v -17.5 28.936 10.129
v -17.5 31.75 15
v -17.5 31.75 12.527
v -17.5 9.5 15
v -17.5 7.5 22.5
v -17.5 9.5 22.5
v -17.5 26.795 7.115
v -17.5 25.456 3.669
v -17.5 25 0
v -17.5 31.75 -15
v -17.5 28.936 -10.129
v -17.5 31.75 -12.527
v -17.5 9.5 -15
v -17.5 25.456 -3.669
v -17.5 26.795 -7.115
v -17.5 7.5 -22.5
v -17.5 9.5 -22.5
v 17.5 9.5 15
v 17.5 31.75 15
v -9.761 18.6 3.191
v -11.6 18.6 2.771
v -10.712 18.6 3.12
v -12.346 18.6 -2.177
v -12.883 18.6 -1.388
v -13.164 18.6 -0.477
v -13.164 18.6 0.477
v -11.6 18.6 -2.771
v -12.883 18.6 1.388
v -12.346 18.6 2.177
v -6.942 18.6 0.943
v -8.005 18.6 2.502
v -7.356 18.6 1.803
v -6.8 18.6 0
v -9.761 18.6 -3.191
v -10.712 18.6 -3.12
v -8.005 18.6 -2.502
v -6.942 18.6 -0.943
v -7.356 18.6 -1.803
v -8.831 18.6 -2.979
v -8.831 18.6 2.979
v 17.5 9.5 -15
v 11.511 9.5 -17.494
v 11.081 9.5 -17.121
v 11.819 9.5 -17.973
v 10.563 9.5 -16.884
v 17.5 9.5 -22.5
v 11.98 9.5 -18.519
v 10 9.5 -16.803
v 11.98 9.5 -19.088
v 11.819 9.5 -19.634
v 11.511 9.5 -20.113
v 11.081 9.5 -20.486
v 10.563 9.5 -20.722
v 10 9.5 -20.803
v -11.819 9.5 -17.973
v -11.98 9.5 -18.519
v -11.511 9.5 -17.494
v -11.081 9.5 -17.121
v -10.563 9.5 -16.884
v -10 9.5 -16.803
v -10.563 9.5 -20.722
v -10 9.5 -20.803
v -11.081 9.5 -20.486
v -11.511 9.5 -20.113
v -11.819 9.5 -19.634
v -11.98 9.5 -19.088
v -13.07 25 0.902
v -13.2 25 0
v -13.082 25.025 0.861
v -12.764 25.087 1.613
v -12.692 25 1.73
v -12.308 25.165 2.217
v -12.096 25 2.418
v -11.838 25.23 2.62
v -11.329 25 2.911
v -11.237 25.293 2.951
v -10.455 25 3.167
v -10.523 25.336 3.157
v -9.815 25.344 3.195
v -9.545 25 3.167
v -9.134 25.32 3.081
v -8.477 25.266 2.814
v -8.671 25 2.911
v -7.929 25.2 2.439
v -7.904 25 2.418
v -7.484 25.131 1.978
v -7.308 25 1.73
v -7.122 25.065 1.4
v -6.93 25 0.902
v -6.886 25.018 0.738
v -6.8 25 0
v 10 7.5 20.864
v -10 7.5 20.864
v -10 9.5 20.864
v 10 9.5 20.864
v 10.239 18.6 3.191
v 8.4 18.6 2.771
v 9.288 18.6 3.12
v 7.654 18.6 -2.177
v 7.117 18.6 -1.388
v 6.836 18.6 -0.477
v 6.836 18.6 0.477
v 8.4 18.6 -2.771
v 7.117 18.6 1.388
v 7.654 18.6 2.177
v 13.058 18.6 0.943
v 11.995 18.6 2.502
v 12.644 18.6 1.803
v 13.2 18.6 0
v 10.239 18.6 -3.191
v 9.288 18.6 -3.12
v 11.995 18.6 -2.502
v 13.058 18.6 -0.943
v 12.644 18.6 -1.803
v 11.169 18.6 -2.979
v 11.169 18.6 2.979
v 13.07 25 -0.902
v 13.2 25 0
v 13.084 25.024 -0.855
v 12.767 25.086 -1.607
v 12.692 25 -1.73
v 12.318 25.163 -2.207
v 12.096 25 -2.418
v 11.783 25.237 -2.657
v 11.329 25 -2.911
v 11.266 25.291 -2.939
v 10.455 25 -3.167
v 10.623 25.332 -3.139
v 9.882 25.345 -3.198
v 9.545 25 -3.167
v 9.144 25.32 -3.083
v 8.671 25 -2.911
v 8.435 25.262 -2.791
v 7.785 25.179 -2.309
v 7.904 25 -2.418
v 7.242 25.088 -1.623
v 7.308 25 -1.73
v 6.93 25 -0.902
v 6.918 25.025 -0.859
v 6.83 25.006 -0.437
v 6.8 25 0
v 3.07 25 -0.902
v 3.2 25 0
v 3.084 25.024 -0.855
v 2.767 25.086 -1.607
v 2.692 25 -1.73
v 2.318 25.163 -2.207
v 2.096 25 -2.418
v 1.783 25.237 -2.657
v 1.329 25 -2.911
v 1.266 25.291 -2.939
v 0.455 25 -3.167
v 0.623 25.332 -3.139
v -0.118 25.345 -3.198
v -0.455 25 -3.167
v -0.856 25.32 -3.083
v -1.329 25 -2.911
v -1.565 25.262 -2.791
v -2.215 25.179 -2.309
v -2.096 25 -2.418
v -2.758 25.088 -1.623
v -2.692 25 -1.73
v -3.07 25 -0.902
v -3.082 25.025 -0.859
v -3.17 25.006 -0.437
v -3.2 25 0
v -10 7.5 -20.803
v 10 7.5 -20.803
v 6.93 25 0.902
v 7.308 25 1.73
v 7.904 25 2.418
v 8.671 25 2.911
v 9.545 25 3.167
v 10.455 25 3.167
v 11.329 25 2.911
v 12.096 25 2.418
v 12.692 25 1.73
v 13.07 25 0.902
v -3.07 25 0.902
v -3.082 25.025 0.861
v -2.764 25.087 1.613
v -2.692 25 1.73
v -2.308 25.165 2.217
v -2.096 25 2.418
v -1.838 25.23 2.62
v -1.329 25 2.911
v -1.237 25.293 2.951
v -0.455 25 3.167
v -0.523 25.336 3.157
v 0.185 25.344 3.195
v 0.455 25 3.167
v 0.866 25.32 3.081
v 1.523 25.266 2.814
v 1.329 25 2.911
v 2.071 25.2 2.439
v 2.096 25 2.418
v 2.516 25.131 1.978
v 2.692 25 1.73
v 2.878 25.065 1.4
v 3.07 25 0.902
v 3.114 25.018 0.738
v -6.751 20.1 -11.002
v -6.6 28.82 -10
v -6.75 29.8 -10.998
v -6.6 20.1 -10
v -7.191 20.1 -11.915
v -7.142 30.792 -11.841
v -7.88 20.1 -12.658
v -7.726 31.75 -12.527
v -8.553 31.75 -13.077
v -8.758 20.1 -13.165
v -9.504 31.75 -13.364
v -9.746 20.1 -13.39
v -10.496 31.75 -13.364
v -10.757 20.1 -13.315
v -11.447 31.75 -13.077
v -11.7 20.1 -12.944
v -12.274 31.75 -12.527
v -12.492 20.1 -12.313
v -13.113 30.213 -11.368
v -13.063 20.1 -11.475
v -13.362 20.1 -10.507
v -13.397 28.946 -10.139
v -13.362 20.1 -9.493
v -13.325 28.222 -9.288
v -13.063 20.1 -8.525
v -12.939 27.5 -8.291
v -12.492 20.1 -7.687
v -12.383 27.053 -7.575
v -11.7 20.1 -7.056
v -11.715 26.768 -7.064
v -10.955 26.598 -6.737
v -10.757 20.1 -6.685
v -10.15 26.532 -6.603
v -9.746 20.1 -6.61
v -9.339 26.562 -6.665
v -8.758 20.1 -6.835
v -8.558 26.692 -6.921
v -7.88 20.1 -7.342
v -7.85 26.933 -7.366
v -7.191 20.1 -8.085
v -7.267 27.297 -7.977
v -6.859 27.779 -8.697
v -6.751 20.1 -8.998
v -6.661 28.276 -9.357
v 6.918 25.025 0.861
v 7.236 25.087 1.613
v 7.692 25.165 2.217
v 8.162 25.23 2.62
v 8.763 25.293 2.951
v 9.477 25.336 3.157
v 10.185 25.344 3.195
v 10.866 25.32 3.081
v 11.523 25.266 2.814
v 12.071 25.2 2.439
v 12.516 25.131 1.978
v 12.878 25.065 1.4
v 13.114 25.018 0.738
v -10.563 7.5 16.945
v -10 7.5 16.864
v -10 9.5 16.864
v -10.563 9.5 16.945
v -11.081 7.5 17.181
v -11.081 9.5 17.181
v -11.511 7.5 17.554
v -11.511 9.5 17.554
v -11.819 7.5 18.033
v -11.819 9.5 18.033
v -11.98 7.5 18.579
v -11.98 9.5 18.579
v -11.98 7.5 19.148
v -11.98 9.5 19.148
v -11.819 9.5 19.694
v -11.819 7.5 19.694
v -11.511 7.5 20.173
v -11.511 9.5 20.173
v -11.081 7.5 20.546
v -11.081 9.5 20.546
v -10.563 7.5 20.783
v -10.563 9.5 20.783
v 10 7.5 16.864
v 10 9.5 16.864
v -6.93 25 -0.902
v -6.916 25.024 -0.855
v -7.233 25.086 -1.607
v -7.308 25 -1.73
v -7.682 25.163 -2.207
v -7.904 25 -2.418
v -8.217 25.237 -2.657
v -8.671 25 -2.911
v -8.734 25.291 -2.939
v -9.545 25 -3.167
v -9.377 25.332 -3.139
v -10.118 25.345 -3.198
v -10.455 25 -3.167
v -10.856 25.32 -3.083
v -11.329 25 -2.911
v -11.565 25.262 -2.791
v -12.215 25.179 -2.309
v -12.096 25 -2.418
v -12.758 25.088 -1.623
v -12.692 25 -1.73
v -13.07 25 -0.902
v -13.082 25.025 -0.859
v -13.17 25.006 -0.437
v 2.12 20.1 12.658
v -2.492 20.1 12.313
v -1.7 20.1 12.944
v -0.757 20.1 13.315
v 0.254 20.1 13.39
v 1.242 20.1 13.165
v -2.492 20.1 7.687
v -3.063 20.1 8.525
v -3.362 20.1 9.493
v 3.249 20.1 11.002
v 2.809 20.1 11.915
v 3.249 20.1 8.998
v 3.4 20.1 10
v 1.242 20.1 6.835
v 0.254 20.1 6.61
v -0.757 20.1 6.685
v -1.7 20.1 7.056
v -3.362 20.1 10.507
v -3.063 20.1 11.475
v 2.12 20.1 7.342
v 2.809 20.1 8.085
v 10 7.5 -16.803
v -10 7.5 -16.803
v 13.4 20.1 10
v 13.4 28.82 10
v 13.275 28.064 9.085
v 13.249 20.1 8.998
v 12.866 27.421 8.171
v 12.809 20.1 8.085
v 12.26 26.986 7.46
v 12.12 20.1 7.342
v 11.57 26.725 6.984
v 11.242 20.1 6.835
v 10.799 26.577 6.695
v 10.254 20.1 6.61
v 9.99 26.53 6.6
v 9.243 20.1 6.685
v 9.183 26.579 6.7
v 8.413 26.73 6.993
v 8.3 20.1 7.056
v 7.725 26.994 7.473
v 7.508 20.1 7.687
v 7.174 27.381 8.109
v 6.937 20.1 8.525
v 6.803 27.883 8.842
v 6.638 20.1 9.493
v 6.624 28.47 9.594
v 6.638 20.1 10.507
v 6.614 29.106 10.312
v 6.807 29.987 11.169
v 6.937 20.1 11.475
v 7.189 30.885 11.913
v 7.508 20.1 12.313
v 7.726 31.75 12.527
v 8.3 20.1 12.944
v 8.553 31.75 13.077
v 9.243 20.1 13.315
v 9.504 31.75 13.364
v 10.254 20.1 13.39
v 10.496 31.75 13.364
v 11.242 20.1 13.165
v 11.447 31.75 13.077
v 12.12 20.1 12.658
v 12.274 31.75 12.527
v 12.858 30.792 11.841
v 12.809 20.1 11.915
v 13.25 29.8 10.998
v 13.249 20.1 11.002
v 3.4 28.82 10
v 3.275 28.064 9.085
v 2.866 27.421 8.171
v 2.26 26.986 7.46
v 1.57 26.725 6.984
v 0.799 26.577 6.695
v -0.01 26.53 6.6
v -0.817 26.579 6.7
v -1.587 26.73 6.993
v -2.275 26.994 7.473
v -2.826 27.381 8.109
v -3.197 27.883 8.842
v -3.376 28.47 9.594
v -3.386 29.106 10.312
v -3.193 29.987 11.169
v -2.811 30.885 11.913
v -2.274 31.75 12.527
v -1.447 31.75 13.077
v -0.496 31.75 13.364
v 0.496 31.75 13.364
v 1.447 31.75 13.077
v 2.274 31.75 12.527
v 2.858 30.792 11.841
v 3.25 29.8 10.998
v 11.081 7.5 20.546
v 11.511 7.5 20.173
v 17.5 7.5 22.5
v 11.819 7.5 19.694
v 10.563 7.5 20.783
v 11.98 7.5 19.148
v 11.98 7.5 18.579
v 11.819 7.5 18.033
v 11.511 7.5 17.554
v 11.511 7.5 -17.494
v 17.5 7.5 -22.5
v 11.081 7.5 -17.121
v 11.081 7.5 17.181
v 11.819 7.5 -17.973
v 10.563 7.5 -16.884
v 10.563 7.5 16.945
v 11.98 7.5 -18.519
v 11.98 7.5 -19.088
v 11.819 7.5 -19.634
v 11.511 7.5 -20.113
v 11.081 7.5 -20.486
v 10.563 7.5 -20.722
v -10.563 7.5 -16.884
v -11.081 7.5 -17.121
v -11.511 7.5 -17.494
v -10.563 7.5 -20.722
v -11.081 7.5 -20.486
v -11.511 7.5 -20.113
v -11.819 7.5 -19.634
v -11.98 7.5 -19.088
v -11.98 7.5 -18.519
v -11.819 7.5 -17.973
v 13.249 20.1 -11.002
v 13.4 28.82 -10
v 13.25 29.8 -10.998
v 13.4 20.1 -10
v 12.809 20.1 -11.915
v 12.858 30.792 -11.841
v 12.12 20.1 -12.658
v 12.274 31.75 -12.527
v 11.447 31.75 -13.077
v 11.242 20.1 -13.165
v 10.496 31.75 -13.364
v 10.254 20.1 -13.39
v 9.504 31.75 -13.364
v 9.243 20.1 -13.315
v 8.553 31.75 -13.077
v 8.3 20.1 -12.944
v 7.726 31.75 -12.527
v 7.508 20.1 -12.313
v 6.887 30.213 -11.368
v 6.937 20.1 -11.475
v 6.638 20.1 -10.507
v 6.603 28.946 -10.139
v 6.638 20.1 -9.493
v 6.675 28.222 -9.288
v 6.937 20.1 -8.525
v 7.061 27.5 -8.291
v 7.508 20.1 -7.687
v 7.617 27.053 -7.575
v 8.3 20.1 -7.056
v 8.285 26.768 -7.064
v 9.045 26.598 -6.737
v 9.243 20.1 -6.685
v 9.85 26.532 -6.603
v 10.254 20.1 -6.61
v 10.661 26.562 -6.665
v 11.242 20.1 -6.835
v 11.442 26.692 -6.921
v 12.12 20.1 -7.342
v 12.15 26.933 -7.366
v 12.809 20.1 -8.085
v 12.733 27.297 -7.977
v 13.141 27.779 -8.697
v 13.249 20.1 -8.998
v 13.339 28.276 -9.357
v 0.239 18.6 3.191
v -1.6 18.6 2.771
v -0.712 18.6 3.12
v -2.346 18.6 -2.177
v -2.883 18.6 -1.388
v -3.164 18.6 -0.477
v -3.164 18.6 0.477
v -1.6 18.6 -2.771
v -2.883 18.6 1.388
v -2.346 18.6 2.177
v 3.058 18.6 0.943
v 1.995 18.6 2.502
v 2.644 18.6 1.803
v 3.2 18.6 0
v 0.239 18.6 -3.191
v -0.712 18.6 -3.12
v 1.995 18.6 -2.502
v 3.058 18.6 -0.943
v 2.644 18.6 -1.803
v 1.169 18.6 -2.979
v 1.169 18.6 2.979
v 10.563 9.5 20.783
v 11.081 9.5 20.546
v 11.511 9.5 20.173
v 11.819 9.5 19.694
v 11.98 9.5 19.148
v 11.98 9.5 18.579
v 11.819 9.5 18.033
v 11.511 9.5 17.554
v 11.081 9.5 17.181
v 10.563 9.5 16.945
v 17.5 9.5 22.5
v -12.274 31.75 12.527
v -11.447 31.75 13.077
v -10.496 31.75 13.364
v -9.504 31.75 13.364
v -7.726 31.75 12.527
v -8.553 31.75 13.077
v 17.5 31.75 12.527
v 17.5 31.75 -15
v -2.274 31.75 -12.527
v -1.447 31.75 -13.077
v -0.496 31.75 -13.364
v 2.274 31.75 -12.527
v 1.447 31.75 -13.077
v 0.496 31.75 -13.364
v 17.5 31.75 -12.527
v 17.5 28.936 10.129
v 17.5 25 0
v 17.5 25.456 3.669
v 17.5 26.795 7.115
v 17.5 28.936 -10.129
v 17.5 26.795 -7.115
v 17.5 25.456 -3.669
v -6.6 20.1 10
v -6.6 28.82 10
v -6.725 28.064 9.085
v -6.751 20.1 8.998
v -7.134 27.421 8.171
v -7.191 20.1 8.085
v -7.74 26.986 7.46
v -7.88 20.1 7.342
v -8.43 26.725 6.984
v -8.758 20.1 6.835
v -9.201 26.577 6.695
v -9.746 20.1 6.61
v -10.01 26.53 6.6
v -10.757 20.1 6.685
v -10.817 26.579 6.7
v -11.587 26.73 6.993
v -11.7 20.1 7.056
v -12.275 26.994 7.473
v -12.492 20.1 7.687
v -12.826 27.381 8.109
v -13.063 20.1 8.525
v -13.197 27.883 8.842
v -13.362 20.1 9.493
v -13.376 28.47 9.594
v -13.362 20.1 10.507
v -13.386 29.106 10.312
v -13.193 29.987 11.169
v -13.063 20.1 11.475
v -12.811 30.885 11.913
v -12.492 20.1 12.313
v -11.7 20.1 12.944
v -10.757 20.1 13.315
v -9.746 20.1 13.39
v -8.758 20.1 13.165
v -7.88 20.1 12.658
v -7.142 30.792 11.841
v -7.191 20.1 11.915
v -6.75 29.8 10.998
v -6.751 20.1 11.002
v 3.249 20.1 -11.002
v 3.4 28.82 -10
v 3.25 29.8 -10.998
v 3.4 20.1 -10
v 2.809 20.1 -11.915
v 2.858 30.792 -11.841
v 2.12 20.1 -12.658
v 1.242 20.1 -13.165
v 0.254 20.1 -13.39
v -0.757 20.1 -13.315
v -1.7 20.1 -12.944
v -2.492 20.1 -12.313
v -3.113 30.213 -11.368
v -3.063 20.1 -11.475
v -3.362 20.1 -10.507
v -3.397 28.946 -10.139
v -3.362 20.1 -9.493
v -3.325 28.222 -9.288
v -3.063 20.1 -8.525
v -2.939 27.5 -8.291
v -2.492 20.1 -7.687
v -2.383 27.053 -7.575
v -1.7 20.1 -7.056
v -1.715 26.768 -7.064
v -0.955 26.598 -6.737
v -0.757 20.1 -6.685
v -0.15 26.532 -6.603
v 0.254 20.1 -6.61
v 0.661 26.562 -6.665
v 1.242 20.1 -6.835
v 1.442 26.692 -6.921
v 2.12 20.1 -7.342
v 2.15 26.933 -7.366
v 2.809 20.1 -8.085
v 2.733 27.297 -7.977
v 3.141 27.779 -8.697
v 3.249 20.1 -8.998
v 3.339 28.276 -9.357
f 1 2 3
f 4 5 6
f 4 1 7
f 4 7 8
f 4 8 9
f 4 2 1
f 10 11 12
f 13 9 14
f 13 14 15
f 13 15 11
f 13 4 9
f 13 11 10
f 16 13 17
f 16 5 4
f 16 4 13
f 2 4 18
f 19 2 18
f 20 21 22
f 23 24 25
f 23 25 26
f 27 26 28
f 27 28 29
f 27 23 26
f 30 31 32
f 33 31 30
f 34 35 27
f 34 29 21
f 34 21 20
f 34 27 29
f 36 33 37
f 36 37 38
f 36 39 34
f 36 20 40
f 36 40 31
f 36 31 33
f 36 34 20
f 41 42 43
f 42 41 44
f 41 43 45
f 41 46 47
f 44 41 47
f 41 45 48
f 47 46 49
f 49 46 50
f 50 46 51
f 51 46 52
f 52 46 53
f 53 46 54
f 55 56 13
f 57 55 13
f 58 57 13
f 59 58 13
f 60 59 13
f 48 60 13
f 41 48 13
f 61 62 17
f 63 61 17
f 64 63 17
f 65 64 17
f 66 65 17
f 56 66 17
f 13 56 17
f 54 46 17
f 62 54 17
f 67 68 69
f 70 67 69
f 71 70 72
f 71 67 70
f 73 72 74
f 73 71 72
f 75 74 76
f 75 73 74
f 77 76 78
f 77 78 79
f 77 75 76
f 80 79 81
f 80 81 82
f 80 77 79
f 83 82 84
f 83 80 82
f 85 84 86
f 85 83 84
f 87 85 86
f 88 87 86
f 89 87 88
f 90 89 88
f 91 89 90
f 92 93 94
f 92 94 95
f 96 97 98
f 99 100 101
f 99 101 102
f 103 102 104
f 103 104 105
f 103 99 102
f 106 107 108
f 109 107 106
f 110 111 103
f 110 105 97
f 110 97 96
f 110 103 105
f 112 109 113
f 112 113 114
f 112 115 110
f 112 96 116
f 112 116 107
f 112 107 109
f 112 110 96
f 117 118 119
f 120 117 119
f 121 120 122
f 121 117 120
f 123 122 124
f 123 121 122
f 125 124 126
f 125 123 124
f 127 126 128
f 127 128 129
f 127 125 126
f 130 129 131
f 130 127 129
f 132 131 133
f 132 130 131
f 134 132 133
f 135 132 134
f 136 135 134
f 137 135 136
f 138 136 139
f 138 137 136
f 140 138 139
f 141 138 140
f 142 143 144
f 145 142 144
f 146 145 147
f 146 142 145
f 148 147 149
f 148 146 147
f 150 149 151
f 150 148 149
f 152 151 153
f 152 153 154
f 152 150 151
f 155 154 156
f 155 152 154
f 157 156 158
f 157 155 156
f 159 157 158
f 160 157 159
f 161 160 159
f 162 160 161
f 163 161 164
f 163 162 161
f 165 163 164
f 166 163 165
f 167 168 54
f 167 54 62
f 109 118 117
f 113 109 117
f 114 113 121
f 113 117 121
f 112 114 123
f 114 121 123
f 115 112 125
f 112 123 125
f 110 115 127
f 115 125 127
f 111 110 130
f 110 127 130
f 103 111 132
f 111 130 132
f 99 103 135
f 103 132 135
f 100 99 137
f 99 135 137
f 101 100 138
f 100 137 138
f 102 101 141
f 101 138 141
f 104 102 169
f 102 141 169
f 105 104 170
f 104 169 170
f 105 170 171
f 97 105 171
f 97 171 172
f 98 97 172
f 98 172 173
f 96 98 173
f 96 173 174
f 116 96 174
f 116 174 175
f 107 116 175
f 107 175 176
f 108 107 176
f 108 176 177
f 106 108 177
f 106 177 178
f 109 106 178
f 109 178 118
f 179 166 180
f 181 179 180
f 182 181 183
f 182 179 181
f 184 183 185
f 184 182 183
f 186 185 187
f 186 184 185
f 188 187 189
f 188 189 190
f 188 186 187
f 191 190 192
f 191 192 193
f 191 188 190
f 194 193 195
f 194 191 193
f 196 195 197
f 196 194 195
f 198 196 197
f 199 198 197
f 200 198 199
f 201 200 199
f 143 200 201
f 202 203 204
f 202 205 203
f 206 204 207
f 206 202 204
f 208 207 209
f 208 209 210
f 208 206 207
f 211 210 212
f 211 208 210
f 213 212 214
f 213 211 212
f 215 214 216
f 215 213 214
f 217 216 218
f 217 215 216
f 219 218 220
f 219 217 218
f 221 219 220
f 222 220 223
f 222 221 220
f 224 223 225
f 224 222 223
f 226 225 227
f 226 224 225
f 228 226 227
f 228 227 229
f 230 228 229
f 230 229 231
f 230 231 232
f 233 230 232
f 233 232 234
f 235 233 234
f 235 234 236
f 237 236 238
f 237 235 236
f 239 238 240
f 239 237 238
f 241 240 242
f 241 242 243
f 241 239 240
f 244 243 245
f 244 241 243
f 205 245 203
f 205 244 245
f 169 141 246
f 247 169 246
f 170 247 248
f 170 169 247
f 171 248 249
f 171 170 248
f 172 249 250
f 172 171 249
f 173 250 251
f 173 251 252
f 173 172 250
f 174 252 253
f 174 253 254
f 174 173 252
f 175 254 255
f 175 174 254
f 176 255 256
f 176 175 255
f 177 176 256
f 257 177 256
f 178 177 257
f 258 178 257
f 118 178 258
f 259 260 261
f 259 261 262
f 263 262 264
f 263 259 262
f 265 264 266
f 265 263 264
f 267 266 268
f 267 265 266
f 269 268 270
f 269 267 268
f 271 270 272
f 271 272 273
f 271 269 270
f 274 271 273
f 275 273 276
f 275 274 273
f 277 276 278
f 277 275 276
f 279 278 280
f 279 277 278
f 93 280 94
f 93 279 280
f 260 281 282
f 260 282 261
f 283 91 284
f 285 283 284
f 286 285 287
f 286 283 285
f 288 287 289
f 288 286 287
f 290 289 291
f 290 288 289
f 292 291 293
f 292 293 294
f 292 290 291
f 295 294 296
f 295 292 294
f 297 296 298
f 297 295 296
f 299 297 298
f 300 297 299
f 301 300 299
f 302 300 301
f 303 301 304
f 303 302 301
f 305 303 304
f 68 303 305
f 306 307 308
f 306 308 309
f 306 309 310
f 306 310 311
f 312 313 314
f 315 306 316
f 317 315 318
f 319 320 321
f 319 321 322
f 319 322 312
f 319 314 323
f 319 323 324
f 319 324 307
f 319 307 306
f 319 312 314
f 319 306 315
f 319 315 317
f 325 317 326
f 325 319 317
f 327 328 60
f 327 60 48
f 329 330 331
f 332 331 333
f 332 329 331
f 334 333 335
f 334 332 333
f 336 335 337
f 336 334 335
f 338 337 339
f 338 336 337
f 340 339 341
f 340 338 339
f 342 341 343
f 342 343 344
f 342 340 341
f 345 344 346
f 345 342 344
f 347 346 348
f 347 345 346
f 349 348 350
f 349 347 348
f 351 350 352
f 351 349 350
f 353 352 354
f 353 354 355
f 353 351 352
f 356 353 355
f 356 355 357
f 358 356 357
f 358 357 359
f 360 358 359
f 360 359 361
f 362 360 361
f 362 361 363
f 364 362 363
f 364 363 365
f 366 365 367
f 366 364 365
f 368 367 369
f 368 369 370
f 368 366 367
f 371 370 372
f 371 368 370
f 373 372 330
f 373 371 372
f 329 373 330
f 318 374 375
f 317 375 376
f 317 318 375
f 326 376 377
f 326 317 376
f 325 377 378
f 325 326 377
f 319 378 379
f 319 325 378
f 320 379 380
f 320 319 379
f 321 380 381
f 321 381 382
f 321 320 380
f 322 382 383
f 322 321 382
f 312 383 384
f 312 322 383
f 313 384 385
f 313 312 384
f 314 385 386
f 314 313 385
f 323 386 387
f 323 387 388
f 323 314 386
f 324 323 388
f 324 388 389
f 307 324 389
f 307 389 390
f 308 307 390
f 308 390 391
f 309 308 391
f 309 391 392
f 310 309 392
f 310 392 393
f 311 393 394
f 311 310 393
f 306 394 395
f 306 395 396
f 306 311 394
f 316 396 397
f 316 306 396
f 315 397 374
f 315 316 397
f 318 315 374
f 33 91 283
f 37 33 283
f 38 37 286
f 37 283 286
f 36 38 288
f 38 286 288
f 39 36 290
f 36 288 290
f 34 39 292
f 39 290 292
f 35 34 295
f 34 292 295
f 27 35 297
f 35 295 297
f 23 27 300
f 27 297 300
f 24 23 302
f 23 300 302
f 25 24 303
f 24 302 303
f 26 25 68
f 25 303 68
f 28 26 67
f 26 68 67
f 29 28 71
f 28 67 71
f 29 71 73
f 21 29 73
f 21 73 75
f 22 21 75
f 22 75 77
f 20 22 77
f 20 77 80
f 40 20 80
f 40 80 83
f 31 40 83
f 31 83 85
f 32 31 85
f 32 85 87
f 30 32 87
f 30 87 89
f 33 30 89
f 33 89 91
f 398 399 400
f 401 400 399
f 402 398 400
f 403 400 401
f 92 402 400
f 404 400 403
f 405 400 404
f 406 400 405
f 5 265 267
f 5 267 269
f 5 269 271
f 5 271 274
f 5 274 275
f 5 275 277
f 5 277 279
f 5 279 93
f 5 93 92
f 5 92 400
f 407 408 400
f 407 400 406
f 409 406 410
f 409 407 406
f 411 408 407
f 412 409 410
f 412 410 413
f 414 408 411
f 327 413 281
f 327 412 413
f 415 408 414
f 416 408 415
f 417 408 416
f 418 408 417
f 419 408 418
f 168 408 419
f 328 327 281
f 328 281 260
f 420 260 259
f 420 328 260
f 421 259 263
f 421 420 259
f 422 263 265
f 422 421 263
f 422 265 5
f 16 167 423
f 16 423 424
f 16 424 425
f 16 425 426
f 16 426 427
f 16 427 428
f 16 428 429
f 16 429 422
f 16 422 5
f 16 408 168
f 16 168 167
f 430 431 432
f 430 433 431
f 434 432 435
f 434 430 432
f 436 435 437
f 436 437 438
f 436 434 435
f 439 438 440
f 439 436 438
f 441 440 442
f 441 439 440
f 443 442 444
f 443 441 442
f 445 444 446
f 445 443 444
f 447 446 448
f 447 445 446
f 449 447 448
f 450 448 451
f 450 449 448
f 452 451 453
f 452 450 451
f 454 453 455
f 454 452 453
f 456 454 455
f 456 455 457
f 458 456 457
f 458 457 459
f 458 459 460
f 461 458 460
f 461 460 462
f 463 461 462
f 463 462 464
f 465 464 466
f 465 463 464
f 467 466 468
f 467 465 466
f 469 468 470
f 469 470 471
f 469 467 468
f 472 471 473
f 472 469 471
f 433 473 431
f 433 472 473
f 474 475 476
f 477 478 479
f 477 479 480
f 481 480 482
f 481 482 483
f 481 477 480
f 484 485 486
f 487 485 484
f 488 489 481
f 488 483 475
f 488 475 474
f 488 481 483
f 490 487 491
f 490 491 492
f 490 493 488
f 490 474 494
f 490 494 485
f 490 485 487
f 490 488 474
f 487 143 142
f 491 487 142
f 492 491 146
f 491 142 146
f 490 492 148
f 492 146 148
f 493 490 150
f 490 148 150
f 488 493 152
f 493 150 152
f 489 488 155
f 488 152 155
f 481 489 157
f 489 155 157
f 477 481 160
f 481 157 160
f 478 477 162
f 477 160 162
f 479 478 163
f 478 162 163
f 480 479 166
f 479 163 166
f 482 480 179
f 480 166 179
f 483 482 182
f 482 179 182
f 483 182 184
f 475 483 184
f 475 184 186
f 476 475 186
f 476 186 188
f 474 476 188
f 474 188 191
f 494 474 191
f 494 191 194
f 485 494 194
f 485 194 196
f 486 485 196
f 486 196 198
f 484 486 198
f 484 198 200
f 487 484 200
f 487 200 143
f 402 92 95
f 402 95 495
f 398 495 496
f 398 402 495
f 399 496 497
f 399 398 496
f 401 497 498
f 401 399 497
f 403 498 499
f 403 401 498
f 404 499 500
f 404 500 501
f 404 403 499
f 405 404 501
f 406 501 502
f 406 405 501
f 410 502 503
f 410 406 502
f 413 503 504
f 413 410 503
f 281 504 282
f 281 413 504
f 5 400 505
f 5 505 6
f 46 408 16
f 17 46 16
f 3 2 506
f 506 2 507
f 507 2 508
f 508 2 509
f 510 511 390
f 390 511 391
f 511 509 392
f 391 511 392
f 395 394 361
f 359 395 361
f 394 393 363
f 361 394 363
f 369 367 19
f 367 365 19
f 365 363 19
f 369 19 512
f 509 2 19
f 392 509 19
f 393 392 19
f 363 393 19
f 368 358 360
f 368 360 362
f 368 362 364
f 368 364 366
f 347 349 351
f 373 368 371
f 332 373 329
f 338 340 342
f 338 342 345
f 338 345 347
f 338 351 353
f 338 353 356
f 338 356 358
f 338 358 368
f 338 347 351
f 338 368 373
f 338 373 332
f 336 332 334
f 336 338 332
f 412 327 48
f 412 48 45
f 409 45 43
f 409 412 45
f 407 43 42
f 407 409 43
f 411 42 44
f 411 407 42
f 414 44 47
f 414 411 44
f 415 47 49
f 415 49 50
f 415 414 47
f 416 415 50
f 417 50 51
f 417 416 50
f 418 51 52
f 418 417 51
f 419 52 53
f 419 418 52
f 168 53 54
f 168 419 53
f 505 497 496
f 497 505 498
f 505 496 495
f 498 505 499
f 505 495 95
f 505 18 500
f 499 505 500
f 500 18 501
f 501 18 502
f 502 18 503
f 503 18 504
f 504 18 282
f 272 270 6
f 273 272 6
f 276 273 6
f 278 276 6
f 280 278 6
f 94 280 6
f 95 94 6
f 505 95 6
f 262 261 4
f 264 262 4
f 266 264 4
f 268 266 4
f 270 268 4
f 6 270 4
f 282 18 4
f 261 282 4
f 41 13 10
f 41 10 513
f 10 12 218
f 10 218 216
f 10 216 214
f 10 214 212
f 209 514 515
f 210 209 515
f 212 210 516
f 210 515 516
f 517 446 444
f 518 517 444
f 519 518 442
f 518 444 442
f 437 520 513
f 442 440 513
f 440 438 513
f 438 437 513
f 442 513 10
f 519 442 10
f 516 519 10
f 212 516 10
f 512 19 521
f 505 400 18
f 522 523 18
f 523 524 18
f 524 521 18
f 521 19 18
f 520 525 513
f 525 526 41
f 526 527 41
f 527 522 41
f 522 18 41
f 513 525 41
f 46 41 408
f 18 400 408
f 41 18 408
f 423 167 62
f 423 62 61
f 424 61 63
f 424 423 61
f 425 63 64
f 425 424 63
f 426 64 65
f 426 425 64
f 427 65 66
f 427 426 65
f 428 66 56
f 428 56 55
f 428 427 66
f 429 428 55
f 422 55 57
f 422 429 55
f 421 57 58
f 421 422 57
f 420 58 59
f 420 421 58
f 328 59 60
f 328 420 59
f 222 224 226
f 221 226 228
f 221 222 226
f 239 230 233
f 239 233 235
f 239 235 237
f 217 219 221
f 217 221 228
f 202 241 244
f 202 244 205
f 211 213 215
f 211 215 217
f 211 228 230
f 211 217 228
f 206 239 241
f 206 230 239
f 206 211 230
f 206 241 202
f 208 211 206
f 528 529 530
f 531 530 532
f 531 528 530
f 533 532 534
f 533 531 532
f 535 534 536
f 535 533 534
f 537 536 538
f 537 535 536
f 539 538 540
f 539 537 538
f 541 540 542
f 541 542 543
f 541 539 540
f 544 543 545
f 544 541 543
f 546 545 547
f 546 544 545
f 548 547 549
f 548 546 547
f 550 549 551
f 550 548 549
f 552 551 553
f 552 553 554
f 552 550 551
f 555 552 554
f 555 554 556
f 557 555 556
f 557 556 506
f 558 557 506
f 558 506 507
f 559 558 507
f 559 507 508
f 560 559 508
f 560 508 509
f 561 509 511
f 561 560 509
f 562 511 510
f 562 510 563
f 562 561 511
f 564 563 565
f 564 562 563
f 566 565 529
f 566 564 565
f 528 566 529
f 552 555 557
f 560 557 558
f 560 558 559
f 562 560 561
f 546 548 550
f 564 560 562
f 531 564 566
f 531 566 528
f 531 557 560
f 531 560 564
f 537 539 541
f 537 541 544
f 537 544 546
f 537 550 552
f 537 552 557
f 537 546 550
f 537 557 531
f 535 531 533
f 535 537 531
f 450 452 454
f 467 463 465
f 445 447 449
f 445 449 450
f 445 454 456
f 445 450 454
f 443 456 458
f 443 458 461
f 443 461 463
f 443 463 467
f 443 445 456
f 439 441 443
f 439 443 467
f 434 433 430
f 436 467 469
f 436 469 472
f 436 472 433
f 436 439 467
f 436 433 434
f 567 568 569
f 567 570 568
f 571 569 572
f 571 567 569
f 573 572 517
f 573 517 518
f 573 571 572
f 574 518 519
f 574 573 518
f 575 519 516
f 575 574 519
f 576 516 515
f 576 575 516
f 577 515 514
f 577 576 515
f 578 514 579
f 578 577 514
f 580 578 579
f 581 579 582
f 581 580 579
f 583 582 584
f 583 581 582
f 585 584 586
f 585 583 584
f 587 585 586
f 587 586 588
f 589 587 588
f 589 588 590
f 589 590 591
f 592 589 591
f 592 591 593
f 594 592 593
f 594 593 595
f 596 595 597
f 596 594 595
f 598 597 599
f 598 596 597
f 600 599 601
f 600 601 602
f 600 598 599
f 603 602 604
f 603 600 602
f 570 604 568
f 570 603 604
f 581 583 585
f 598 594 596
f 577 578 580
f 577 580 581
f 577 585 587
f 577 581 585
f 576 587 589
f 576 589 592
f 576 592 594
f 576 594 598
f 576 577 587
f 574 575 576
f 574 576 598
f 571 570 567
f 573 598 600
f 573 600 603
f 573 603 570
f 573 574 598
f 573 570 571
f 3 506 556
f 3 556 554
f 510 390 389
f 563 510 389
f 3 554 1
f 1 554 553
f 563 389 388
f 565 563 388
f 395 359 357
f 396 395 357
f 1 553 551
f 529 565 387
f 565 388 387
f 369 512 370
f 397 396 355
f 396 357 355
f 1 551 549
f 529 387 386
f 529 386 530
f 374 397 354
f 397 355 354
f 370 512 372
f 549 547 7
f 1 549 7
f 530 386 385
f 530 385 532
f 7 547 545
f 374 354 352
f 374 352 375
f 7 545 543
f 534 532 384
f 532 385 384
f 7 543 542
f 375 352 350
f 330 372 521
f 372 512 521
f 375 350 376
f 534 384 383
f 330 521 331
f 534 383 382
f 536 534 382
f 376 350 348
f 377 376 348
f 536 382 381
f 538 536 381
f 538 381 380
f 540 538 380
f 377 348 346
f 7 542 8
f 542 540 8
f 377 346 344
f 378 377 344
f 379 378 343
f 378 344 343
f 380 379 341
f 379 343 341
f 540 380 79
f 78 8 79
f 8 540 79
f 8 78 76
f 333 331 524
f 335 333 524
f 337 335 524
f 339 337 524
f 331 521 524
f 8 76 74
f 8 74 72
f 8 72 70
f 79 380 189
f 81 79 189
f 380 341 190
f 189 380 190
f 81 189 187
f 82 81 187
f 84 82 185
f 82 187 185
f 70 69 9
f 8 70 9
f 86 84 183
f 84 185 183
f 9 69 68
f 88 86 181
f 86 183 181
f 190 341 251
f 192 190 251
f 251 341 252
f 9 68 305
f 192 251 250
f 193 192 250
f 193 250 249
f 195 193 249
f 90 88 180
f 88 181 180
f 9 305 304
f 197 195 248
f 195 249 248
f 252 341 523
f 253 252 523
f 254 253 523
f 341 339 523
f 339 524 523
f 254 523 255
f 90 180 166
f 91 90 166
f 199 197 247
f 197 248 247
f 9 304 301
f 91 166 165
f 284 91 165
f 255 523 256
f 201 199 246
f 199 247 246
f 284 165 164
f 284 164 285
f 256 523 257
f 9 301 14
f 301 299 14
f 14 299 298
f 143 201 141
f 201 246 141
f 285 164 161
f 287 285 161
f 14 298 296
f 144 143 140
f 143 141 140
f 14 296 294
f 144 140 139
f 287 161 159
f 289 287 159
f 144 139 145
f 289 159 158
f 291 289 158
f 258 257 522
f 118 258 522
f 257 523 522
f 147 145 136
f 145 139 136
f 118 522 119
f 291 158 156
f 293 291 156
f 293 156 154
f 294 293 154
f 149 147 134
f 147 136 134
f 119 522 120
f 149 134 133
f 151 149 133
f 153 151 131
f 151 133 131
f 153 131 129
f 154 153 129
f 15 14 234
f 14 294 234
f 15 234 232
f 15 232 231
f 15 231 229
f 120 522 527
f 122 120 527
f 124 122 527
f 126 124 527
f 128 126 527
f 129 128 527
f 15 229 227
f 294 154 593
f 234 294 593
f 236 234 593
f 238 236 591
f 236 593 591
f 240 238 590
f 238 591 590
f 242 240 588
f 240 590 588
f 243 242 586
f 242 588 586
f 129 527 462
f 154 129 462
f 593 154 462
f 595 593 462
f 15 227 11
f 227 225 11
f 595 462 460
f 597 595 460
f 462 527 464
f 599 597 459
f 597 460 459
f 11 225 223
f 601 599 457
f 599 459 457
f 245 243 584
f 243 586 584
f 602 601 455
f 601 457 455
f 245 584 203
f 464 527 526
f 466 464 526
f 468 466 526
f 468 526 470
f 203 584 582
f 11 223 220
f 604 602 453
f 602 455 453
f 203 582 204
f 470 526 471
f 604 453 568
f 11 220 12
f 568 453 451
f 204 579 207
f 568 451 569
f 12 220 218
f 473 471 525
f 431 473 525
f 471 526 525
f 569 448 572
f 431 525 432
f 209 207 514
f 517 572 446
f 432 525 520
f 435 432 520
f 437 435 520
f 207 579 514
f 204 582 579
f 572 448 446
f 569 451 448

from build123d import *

# Parameters (mm, degrees)
SKETCH8_W                       = 35
SKETCH8_H                       = 30
BOSS_EXTRUDE7_DEPTH             = 80
SKETCH10_R                      = 15
CUT_EXTRUDE3_DEPTH              = 18.5
CUT_EXTRUDE3_DEPTH_BACK         = 18.5
SKETCH11_W                      = 38.336381606
SKETCH11_H                      = 16.50007926
CUT_EXTRUDE4_DEPTH              = 18.5
CUT_EXTRUDE4_DEPTH_BACK         = 18.5
SKETCH12_W                      = 33.824881692
SKETCH12_H                      = 7.5
CUT_EXTRUDE5_DEPTH              = 18.5
CUT_EXTRUDE5_DEPTH_BACK         = 18.5
SKETCH13_W                      = 45.541829225
SKETCH13_H                      = 41.48776408
CUT_EXTRUDE6_DEPTH              = 18.5
CUT_EXTRUDE6_DEPTH_BACK         = 18.5
SKETCH15_W                      = 35
SKETCH15_H                      = 7.5
BOSS_EXTRUDE9_DEPTH             = 2
CUT_EXTRUDE7_DEPTH              = 2
SKETCH18_R                      = 3.2
CUT_EXTRUDE10_DEPTH             = 7.74996037
CUT_EXTRUDE10_DEPTH_BACK        = 6.4
CUT_EXTRUDE11_REACH             = 8.75
SKETCH19_R                      = 3.4
CUT_EXTRUDE11_DIRECTION_2_DEPTH = 4.9


with BuildPart() as part:
    # Sketch8 → Boss-Extrude7 (new body)
    with BuildSketch(Plane(origin=(0, 0, 0), x_dir=(1, 0, 0), z_dir=(0, 1, 0))):
        Rectangle(SKETCH8_W, SKETCH8_H)
    extrude(amount=BOSS_EXTRUDE7_DEPTH)

    # Sketch10 → Cut-Extrude3 (cut, two sides)
    with BuildSketch(Plane(origin=(0, 0, 0), x_dir=(0, 0, -1), z_dir=(1, 0, 0))) as cut_extrude3_sk:
        with Locations((0, 40)):
            Circle(SKETCH10_R)
    extrude(amount=CUT_EXTRUDE3_DEPTH, mode=Mode.SUBTRACT)
    extrude(cut_extrude3_sk.sketch, amount=-CUT_EXTRUDE3_DEPTH_BACK, mode=Mode.SUBTRACT)

    # Sketch11 → Cut-Extrude4 (cut, two sides)
    with BuildSketch(Plane(origin=(0, 0, 0), x_dir=(0, 0, -1), z_dir=(1, 0, 0))) as cut_extrude4_sk:
        with Locations((0, 40)):
            Rectangle(SKETCH11_W, SKETCH11_H)
    extrude(amount=CUT_EXTRUDE4_DEPTH, mode=Mode.SUBTRACT)
    extrude(cut_extrude4_sk.sketch, amount=-CUT_EXTRUDE4_DEPTH_BACK, mode=Mode.SUBTRACT)

    # Sketch12 → Cut-Extrude5 (cut, two sides)
    with BuildSketch(Plane(origin=(0, 0, 0), x_dir=(0, 0, -1), z_dir=(1, 0, 0))) as cut_extrude5_sk:
        with Locations((0.439040256, 3.75)):
            Rectangle(SKETCH12_W, SKETCH12_H)
    extrude(amount=CUT_EXTRUDE5_DEPTH, mode=Mode.SUBTRACT)
    extrude(cut_extrude5_sk.sketch, amount=-CUT_EXTRUDE5_DEPTH_BACK, mode=Mode.SUBTRACT)

    # Sketch13 → Cut-Extrude6 (cut, two sides)
    with BuildSketch(Plane(origin=(0, 0, 0), x_dir=(0, 0, -1), z_dir=(1, 0, 0))) as cut_extrude6_sk:
        with Locations((-6.569234617, 60.808180877)):
            Rectangle(SKETCH13_W, SKETCH13_H)
    extrude(amount=CUT_EXTRUDE6_DEPTH, mode=Mode.SUBTRACT)
    extrude(cut_extrude6_sk.sketch, amount=-CUT_EXTRUDE6_DEPTH_BACK, mode=Mode.SUBTRACT)

    # Sketch15 → Boss-Extrude9 (add)
    with BuildSketch(Plane(origin=(0, 7.5, 0), x_dir=(-1, 0, 0), z_dir=(0, -1, 0))):
        with Locations((0, -18.75)):
            Rectangle(SKETCH15_W, SKETCH15_H)
        with Locations((0, 18.75)):
            Rectangle(SKETCH15_W, SKETCH15_H)
    extrude(amount=-BOSS_EXTRUDE9_DEPTH)

    # Sketch16 → Cut-Extrude7 (cut)
    with BuildSketch(Plane(origin=(0, 7.5, 0), x_dir=(-1, 0, 0), z_dir=(0, -1, 0))):
        with BuildLine():
            Line((10, -20.863517543), (-10, -20.863517543))
            ThreePointArc((-10, -20.863517543), (-12, -18.863517543), (-10, -16.863517543))
            Line((-10, -16.863517543), (10, -16.863517543))
            ThreePointArc((10, -16.863517543), (12, -18.863517543), (10, -20.863517543))
        make_face()
        with BuildLine():
            Line((10, 16.803450623), (-10, 16.803450623))
            ThreePointArc((-10, 16.803450623), (-12, 18.803450623), (-10, 20.803450623))
            Line((-10, 20.803450623), (10, 20.803450623))
            ThreePointArc((10, 20.803450623), (12, 18.803450623), (10, 16.803450623))
        make_face()
    extrude(amount=-CUT_EXTRUDE7_DEPTH, mode=Mode.SUBTRACT)

    # Sketch18 → Cut-Extrude10 (cut, two sides)
    with BuildSketch(Plane(origin=(0, 25, 0), x_dir=(1, 0, 0), z_dir=(0, 1, 0))) as cut_extrude10_sk:
        Circle(SKETCH18_R)
        with Locations((10, 0)):
            Circle(SKETCH18_R)
        with Locations((-10, 0)):
            Circle(SKETCH18_R)
    extrude(amount=CUT_EXTRUDE10_DEPTH, mode=Mode.SUBTRACT)
    extrude(cut_extrude10_sk.sketch, amount=-CUT_EXTRUDE10_DEPTH_BACK, mode=Mode.SUBTRACT)

    # Sketch19 → Cut-Extrude11 (cut, up to next)
    with BuildSketch(Plane(origin=(0, 25, 0), x_dir=(1, 0, 0), z_dir=(0, 1, 0)), mode=Mode.PRIVATE) as cut_extrude11_sk1:
        with Locations((-10, -10)):
            Circle(SKETCH19_R)
    cut_extrude11_tool1 = extrude(cut_extrude11_sk1.sketch, amount=CUT_EXTRUDE11_REACH, mode=Mode.PRIVATE) & part.part
    add(cut_extrude11_tool1.solids().sort_by_distance((-10, 25, 10))[0], mode=Mode.SUBTRACT)
    # Sketch19 → Cut-Extrude11 (cut, up to next)
    with BuildSketch(Plane(origin=(0, 25, 0), x_dir=(1, 0, 0), z_dir=(0, 1, 0)), mode=Mode.PRIVATE) as cut_extrude11_sk2:
        with Locations((0, -10)):
            Circle(SKETCH19_R)
    cut_extrude11_tool2 = extrude(cut_extrude11_sk2.sketch, amount=CUT_EXTRUDE11_REACH, mode=Mode.PRIVATE) & part.part
    add(cut_extrude11_tool2.solids().sort_by_distance((0, 25, 10))[0], mode=Mode.SUBTRACT)
    # Sketch19 → Cut-Extrude11 (cut, up to next)
    with BuildSketch(Plane(origin=(0, 25, 0), x_dir=(1, 0, 0), z_dir=(0, 1, 0)), mode=Mode.PRIVATE) as cut_extrude11_sk3:
        with Locations((10, -10)):
            Circle(SKETCH19_R)
    cut_extrude11_tool3 = extrude(cut_extrude11_sk3.sketch, amount=CUT_EXTRUDE11_REACH, mode=Mode.PRIVATE) & part.part
    add(cut_extrude11_tool3.solids().sort_by_distance((10, 25, 10))[0], mode=Mode.SUBTRACT)
    # Sketch19 → Cut-Extrude11 (cut, up to next)
    with BuildSketch(Plane(origin=(0, 25, 0), x_dir=(1, 0, 0), z_dir=(0, 1, 0)), mode=Mode.PRIVATE) as cut_extrude11_sk4:
        with Locations((-10, 10)):
            Circle(SKETCH19_R)
    cut_extrude11_tool4 = extrude(cut_extrude11_sk4.sketch, amount=CUT_EXTRUDE11_REACH, mode=Mode.PRIVATE) & part.part
    add(cut_extrude11_tool4.solids().sort_by_distance((-10, 25, -10))[0], mode=Mode.SUBTRACT)
    # Sketch19 → Cut-Extrude11 (cut, up to next)
    with BuildSketch(Plane(origin=(0, 25, 0), x_dir=(1, 0, 0), z_dir=(0, 1, 0)), mode=Mode.PRIVATE) as cut_extrude11_sk5:
        with Locations((0, 10)):
            Circle(SKETCH19_R)
    cut_extrude11_tool5 = extrude(cut_extrude11_sk5.sketch, amount=CUT_EXTRUDE11_REACH, mode=Mode.PRIVATE) & part.part
    add(cut_extrude11_tool5.solids().sort_by_distance((0, 25, -10))[0], mode=Mode.SUBTRACT)
    # Sketch19 → Cut-Extrude11 (cut, up to next)
    with BuildSketch(Plane(origin=(0, 25, 0), x_dir=(1, 0, 0), z_dir=(0, 1, 0)), mode=Mode.PRIVATE) as cut_extrude11_sk6:
        with Locations((10, 10)):
            Circle(SKETCH19_R)
    cut_extrude11_tool6 = extrude(cut_extrude11_sk6.sketch, amount=CUT_EXTRUDE11_REACH, mode=Mode.PRIVATE) & part.part
    add(cut_extrude11_tool6.solids().sort_by_distance((10, 25, -10))[0], mode=Mode.SUBTRACT)

    # Sketch19 → Cut-Extrude11 direction 2 (cut)
    with BuildSketch(Plane(origin=(0, 25, 0), x_dir=(1, 0, 0), z_dir=(0, 1, 0))):
        with Locations((-10, -10)):
            Circle(SKETCH19_R)
        with Locations((0, -10)):
            Circle(SKETCH19_R)
        with Locations((10, -10)):
            Circle(SKETCH19_R)
        with Locations((-10, 10)):
            Circle(SKETCH19_R)
        with Locations((0, 10)):
            Circle(SKETCH19_R)
        with Locations((10, 10)):
            Circle(SKETCH19_R)
    extrude(amount=-CUT_EXTRUDE11_DIRECTION_2_DEPTH, mode=Mode.SUBTRACT)


solid = part.part
